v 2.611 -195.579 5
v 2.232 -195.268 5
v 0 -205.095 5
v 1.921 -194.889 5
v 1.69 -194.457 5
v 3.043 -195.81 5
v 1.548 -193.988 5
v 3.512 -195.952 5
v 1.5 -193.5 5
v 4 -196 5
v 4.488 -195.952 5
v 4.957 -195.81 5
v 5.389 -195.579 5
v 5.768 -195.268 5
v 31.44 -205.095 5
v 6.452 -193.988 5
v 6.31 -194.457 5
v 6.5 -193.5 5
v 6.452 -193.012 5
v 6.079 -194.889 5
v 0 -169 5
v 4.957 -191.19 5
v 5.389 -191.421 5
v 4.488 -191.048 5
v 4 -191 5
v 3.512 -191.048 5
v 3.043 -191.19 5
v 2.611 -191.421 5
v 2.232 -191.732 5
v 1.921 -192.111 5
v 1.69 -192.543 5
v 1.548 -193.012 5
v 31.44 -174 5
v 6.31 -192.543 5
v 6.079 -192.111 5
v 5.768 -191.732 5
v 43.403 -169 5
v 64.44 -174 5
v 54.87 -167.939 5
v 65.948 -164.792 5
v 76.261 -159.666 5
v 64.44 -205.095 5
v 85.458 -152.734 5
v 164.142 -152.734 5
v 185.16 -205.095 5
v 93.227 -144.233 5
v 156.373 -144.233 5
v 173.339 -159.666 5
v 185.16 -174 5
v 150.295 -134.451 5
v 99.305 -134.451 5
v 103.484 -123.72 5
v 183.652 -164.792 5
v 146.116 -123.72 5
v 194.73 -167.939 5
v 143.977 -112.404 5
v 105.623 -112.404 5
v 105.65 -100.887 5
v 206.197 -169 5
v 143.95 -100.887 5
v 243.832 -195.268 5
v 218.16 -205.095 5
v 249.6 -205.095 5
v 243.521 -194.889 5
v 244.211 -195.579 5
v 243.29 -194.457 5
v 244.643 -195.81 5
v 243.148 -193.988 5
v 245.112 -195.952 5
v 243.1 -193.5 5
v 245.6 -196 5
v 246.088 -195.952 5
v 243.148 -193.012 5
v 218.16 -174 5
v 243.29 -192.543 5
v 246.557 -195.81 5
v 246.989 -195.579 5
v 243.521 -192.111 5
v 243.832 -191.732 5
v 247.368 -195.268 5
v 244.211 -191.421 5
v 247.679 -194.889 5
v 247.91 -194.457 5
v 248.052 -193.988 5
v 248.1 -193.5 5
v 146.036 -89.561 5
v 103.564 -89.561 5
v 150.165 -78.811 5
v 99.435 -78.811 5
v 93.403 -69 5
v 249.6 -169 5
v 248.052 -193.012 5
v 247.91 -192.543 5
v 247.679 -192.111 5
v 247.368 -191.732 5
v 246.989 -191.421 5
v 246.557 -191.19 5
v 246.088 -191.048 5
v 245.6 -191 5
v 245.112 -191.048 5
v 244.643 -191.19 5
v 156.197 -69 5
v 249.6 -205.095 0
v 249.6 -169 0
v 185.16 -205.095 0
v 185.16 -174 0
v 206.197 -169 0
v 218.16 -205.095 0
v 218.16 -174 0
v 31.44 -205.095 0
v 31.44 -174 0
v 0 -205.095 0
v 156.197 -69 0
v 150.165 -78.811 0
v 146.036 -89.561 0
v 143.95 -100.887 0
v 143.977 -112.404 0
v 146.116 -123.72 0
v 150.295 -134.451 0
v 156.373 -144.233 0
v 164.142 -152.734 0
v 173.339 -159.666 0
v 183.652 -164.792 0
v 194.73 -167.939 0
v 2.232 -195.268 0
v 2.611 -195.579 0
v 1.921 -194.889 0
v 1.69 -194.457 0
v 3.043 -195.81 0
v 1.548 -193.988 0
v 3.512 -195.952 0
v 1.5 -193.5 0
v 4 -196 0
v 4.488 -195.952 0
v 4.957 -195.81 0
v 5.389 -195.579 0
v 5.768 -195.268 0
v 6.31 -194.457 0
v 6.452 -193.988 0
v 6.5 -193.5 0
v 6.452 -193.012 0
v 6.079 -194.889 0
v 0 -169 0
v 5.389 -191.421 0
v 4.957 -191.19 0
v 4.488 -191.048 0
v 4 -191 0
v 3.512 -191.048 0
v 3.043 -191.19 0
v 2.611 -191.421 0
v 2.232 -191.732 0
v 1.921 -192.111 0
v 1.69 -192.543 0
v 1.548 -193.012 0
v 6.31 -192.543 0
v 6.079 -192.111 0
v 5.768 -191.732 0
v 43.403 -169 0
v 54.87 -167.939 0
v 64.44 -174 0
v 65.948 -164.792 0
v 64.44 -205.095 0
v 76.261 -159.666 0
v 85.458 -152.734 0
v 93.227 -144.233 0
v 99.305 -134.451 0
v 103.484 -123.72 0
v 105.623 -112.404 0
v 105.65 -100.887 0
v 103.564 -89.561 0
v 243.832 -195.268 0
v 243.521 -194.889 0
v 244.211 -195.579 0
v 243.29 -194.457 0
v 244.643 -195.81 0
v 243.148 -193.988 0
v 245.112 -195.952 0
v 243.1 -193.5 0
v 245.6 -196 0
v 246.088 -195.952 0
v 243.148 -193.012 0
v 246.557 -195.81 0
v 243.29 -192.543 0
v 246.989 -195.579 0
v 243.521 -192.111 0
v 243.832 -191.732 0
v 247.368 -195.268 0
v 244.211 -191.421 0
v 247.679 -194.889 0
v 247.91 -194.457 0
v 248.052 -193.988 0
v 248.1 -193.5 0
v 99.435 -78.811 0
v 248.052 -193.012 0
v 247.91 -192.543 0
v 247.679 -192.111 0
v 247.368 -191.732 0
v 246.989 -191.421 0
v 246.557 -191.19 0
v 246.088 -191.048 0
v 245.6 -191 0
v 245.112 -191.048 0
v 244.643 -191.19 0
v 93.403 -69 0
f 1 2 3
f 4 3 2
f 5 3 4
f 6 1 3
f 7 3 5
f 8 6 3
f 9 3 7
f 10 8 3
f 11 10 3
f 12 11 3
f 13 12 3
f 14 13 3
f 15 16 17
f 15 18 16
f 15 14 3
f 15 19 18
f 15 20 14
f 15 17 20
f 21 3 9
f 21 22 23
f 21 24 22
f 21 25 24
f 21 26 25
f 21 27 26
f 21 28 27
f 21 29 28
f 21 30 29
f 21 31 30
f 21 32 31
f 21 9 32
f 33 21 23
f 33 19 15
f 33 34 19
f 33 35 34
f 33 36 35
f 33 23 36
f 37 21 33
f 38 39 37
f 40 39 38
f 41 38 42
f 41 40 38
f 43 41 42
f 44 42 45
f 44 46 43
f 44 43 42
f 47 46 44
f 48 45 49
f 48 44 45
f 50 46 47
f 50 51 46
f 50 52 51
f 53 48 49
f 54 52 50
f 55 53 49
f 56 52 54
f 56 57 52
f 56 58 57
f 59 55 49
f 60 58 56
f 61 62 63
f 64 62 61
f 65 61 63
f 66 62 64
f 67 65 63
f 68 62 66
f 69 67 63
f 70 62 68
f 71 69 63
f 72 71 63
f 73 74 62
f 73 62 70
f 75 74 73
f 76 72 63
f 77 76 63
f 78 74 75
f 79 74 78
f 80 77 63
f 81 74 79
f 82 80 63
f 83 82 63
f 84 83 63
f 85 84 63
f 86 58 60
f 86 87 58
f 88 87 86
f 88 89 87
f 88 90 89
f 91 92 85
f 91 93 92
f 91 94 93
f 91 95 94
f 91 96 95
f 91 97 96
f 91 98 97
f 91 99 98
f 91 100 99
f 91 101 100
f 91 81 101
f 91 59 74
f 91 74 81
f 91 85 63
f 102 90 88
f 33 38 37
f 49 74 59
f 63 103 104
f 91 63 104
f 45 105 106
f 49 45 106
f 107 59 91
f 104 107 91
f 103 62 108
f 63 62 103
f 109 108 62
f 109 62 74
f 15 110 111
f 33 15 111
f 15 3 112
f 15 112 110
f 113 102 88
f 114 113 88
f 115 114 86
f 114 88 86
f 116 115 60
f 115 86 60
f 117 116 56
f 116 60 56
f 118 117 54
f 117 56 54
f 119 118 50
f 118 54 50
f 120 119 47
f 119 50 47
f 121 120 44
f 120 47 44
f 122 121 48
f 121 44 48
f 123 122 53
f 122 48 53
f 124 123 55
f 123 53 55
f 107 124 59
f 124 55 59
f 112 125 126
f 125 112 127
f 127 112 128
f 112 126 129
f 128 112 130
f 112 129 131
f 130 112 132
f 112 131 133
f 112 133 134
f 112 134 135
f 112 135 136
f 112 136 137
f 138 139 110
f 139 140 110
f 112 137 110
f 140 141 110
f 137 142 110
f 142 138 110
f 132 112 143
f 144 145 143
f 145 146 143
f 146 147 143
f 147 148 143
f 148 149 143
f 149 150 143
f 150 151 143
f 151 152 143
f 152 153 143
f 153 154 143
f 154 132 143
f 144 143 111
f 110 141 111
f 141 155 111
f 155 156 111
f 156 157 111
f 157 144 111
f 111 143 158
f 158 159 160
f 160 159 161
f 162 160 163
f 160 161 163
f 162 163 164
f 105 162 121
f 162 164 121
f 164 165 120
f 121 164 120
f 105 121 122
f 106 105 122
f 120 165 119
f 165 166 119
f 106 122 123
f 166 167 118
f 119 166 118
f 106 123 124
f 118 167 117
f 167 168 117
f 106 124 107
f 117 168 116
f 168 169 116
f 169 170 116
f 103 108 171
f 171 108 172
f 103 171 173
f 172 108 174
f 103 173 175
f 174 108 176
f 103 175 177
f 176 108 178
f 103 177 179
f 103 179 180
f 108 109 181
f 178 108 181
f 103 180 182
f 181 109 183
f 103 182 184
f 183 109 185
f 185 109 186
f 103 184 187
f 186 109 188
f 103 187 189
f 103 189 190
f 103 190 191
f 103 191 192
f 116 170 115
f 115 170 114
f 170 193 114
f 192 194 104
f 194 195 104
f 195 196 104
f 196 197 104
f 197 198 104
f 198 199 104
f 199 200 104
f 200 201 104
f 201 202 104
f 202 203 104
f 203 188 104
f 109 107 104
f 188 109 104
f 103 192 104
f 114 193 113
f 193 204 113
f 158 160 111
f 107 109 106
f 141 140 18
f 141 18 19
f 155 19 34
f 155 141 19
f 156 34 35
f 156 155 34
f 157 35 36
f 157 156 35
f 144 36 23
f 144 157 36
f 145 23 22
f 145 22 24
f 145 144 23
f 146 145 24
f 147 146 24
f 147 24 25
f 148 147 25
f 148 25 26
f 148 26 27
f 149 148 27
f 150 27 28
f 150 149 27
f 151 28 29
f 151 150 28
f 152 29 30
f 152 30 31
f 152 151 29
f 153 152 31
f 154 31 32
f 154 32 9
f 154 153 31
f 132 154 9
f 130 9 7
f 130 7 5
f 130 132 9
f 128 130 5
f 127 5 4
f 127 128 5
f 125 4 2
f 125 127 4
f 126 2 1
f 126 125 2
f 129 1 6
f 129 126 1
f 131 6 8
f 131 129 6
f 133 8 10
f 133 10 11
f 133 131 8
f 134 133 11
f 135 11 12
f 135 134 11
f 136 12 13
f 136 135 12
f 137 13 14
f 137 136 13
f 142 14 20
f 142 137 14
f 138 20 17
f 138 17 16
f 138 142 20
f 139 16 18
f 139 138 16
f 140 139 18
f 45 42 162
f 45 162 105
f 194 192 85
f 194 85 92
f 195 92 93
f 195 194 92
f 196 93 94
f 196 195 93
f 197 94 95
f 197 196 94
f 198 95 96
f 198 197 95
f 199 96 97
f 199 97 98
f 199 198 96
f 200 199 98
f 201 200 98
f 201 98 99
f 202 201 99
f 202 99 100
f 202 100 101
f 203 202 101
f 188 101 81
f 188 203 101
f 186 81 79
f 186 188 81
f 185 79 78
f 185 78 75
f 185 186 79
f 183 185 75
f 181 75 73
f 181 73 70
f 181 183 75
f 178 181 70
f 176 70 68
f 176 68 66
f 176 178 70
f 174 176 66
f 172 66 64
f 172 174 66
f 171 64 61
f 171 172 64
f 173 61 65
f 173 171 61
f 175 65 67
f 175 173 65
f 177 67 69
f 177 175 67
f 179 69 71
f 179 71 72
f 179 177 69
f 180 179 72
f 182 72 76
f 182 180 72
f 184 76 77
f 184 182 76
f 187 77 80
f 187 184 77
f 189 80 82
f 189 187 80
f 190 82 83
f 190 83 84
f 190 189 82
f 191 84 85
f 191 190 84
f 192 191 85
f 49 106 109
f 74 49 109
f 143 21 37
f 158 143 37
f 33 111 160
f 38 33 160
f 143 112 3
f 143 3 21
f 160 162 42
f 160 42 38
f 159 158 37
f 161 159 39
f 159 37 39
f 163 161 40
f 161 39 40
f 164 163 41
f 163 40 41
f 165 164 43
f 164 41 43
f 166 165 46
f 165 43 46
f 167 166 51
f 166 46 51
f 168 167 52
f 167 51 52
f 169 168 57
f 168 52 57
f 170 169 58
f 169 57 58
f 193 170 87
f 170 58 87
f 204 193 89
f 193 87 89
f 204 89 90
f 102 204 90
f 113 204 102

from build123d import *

# Parameters (mm, degrees)
SKETCH1_W           = 249.6
SKETCH1_H           = 267.4
SKETCH1_R           = 2.5
SKETCH1_W_2         = 33
SKETCH1_H_2         = 90
BOSS_EXTRUDE1_DEPTH = 5
SKETCH6_W           = 249.6
SKETCH6_H           = 131.304588604
CUT_EXTRUDE4_DEPTH  = 6


with BuildPart() as part:
    # Sketch1 → Boss-Extrude1 (new body)
    with BuildSketch(Plane.XY):
        with Locations((124.8, -202.7)):
            Rectangle(SKETCH1_W, SKETCH1_H)
        with Locations((245.6, -193.5)):
            Circle(SKETCH1_R, mode=Mode.SUBTRACT)
        with Locations((245.6, -244.5)):
            Circle(SKETCH1_R, mode=Mode.SUBTRACT)
        with Locations((4, -244.5)):
            Circle(SKETCH1_R, mode=Mode.SUBTRACT)
        with Locations((4, -193.5)):
            Circle(SKETCH1_R, mode=Mode.SUBTRACT)
        with Locations((201.66, -219)):
            Rectangle(SKETCH1_W_2, SKETCH1_H_2, mode=Mode.SUBTRACT)
        with Locations((47.94, -219)):
            Rectangle(SKETCH1_W_2, SKETCH1_H_2, mode=Mode.SUBTRACT)
    extrude(amount=BOSS_EXTRUDE1_DEPTH)

    # Sketch6 → Cut-Extrude4 (cut, through all)
    with BuildSketch(Plane.XY.offset(5)):
        with BuildLine():
            Line((43.402860001, -44), (0, -44))
            Line((0, -44), (0, -169))
            Line((0, -169), (43.402860001, -169))
            ThreePointArc((43.402860001, -169), (105.902860001, -106.5), (43.402860001, -44))
        make_face()
        with BuildLine():
            Line((206.197139999, -169), (249.6, -169))
            Line((249.6, -169), (249.6, -44))
            Line((249.6, -44), (206.197139999, -44))
            ThreePointArc((206.197139999, -44), (143.697139999, -106.5), (206.197139999, -169))
        make_face()
        with Locations((124.8, -270.747705698)):
            Rectangle(SKETCH6_W, SKETCH6_H)
    extrude(amount=-CUT_EXTRUDE4_DEPTH, mode=Mode.SUBTRACT)


solid = part.part
